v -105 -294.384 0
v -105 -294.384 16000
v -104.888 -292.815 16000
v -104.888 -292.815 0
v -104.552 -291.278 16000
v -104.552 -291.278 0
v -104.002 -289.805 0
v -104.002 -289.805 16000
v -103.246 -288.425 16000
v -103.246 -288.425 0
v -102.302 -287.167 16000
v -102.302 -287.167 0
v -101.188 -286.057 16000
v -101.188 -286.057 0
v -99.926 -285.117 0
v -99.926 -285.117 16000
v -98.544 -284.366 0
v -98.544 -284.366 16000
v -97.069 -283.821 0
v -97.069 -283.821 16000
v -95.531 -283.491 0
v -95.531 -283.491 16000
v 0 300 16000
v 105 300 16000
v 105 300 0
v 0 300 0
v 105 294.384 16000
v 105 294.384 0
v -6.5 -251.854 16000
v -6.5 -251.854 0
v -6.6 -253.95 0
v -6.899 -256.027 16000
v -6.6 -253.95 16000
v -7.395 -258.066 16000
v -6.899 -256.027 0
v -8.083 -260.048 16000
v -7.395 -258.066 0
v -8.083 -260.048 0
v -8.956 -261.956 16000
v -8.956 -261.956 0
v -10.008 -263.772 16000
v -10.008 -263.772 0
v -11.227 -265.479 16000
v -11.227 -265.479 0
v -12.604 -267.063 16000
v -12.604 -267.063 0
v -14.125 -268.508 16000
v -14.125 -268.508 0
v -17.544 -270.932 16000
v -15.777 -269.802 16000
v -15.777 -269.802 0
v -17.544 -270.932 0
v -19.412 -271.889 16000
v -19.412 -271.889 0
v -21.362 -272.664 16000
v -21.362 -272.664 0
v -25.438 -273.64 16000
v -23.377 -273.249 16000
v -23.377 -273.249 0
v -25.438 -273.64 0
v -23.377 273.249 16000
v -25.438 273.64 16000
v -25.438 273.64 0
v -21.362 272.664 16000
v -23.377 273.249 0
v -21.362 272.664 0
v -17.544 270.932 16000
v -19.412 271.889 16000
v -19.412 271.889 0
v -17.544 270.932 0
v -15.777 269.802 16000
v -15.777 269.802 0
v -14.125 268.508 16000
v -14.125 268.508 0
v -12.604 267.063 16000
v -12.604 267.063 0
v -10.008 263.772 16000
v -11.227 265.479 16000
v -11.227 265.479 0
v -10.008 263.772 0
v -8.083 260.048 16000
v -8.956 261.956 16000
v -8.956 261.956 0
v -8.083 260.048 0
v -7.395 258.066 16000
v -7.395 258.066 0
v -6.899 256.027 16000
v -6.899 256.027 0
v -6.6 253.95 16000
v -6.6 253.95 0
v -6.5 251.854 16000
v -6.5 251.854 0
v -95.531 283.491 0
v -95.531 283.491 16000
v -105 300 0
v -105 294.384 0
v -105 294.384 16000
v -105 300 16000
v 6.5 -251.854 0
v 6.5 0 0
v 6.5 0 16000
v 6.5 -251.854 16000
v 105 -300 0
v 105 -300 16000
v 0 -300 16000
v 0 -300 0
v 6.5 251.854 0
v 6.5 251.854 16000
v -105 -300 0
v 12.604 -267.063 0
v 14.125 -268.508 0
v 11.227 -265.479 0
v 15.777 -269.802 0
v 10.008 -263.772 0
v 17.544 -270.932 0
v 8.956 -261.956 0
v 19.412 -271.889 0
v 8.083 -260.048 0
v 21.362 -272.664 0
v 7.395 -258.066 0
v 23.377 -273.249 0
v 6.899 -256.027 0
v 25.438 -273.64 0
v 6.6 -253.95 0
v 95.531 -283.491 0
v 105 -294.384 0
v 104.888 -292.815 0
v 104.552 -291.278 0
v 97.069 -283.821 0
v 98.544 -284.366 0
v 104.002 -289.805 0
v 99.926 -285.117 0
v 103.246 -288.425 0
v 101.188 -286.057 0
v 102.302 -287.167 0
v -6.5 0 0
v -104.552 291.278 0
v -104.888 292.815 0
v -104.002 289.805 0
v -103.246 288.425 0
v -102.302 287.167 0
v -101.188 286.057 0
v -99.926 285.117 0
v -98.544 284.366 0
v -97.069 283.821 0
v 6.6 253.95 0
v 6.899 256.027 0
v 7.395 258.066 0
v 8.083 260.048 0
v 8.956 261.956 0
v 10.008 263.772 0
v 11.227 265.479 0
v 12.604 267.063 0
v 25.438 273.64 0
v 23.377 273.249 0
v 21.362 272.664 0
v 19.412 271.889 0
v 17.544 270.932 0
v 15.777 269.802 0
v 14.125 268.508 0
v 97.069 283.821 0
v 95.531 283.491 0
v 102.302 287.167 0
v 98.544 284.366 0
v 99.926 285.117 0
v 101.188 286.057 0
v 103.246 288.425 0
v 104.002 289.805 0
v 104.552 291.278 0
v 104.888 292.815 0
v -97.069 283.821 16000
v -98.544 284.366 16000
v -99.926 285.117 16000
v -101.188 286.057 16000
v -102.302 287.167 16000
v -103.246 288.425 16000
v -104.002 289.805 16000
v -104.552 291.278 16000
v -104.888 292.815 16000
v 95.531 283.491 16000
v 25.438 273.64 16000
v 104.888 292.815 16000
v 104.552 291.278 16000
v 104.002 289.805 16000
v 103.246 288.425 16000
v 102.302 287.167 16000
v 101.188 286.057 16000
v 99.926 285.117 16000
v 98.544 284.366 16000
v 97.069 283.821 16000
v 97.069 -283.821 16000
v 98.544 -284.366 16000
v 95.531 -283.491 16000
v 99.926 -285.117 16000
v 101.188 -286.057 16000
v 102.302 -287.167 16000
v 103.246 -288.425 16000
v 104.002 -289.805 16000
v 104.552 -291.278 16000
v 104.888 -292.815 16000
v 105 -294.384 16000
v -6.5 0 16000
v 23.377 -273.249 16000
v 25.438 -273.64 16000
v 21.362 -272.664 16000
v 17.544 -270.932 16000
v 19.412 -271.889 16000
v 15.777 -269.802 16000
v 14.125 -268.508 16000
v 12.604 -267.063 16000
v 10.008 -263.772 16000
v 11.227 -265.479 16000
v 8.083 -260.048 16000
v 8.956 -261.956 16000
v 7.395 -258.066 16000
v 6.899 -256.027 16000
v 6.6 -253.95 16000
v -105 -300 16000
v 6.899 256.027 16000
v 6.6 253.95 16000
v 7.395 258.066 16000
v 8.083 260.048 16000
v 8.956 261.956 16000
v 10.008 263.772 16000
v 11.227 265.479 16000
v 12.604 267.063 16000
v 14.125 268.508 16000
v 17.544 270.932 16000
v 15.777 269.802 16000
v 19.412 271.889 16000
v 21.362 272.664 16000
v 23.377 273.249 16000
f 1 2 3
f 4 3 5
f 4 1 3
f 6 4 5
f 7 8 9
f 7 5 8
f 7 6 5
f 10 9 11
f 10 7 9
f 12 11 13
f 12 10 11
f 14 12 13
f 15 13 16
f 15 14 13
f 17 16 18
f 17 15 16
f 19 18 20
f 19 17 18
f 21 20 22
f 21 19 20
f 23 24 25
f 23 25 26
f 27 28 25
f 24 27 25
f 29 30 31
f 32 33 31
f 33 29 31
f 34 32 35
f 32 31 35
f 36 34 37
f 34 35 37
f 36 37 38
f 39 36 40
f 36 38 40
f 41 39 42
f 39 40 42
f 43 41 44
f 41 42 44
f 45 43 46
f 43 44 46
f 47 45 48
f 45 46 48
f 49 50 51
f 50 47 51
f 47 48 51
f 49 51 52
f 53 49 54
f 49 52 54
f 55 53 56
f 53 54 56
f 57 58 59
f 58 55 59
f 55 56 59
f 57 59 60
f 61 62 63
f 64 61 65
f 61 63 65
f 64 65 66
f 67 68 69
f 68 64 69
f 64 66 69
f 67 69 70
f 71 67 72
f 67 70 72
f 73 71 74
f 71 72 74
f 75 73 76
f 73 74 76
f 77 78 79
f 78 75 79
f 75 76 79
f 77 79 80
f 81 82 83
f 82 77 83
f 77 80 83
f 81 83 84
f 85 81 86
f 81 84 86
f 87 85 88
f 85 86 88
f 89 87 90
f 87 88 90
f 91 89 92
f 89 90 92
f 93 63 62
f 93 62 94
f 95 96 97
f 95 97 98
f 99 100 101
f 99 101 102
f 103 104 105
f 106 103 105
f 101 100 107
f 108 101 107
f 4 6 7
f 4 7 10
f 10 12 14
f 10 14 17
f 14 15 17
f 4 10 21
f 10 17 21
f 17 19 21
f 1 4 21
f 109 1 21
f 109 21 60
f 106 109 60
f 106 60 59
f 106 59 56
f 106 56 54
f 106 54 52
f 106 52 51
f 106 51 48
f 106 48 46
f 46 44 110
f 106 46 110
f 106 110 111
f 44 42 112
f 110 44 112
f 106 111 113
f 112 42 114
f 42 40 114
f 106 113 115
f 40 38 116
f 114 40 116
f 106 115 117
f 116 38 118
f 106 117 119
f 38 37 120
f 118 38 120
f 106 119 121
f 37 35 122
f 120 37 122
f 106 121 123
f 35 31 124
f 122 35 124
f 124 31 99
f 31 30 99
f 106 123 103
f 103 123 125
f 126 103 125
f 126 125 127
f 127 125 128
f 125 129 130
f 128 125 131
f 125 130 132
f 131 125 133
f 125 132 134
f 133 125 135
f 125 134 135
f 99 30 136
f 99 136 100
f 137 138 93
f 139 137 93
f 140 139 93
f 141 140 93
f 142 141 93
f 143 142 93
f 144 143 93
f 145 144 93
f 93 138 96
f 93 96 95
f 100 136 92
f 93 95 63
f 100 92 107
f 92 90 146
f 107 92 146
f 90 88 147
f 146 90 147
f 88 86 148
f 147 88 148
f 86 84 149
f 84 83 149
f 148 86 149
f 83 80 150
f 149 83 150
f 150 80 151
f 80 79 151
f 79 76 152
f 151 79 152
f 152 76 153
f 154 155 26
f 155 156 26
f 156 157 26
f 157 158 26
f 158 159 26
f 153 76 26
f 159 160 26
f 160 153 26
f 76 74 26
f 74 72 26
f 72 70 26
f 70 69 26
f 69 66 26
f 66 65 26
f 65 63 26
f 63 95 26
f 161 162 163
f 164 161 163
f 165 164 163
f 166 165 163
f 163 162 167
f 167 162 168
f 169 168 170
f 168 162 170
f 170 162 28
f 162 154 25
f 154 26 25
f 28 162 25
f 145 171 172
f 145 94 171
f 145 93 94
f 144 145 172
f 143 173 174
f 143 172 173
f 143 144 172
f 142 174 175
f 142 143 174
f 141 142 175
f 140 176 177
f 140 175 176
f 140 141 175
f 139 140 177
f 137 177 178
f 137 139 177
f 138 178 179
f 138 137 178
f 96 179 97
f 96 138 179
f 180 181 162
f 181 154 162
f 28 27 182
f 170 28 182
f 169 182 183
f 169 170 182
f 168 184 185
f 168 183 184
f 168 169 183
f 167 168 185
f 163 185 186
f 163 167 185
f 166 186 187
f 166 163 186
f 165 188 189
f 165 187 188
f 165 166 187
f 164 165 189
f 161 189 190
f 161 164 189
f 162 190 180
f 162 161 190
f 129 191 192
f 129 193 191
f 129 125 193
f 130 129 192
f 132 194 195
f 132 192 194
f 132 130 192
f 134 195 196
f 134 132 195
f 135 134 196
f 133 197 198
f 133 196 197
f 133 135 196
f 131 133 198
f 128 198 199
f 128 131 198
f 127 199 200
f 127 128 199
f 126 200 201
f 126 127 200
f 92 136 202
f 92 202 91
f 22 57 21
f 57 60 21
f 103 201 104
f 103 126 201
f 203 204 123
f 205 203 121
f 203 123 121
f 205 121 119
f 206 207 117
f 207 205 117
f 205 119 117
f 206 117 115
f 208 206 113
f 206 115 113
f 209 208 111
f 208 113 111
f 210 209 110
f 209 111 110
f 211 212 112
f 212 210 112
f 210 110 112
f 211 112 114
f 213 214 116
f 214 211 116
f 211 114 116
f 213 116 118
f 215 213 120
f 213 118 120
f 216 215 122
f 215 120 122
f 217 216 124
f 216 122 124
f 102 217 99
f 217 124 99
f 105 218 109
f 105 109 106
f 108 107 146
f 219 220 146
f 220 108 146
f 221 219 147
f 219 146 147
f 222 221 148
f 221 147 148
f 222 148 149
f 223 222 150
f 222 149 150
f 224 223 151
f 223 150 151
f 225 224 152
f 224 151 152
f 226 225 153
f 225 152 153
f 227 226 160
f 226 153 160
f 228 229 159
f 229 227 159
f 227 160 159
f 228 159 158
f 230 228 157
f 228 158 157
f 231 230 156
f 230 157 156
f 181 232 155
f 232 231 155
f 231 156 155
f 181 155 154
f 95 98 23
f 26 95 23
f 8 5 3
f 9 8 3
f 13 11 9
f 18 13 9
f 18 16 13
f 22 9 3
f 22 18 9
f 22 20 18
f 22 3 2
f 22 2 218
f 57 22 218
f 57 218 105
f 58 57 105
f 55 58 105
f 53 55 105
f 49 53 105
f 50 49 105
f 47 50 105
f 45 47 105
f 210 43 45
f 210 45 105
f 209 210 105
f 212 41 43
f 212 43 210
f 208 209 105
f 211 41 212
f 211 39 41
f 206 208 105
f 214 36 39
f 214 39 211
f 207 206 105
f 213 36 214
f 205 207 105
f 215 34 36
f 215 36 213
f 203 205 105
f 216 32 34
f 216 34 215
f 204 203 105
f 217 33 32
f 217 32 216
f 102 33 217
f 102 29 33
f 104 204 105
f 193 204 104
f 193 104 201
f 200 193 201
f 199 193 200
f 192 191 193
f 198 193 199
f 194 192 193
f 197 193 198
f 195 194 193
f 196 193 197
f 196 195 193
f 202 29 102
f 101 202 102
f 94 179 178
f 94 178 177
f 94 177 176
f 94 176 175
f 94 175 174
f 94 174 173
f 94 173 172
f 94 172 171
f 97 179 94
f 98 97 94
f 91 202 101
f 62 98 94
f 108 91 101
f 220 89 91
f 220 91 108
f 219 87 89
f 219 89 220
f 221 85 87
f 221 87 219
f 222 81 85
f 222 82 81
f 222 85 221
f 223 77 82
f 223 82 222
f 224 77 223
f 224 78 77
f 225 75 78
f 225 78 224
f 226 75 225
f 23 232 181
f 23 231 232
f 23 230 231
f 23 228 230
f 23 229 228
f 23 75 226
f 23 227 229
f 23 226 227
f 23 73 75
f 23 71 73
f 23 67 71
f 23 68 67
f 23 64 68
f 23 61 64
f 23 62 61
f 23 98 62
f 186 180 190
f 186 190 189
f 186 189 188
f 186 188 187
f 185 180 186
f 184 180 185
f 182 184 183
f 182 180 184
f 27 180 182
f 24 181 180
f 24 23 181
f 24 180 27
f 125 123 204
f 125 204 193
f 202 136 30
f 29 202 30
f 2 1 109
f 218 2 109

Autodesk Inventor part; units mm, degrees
ref_plane "YZ Plane" through (0, 0, 0) normal (1, 0, 0) x (0, 1, 0)
ref_plane "Startebene" through (0, 0, 0) normal (0, 0, 1) x (1, 0, 0)
ref_plane "Endebene" through (0, 0, 16000) normal (0, 0, 1) x (1, 0, 0)
sketch "Skizze" plane through (0, 0, 0) normal (0, 0, 1) x (1, 0, 0)
  line L0 (-6.5, 0) -> (-6.5, -251.8541)
  line L1 (-25.4382, -273.64) -> (-95.5309, -283.4908)
  line L2 (-105, -294.3838) -> (-105, -300)
  line L3 (-105, -300) -> (0, -300)
  line L4 (-55.75, -300) -> (-55.75, -277.9) construction
  line L5 (-25.7112, 0) -> (34.2816, 0) construction
  line L6 (0, 40) -> (0, -300) construction
  line L7 (0, -48) -> (0, 64) construction
  line L8 (6.5, 0) -> (6.5, -251.8541)
  line L9 (25.4382, -273.64) -> (95.5309, -283.4908)
  line L10 (105, -294.3838) -> (105, -300)
  line L11 (105, -300) -> (0, -300)
  line L12 (-6.5, 0) -> (6.5, 0) construction
  line L13 (-6.5, 0) -> (-6.5, 251.8541)
  line L14 (-25.4382, 273.64) -> (-95.5309, 283.4908)
  line L15 (-105, 294.3838) -> (-105, 300)
  line L16 (-105, 300) -> (0, 300)
  line L17 (6.5, 0) -> (6.5, 251.8541)
  line L18 (25.4382, 273.64) -> (95.5309, 283.4908)
  line L19 (105, 294.3838) -> (105, 300)
  line L20 (105, 300) -> (0, 300)
  arc A0 (-105, 294.3838) -> (-95.5309, 283.4908) centre (-94, 294.3838) ccw
  arc A1 (95.5309, 283.4908) -> (105, 294.3838) centre (94, 294.3838) ccw
  arc A2 (105, -294.3838) -> (95.5309, -283.4908) centre (94, -294.3838) ccw
  arc A3 (-95.5309, -283.4908) -> (-105, -294.3838) centre (-94, -294.3838) ccw
  arc A4 (-6.5, 251.8541) -> (-25.4382, 273.64) centre (-28.5, 251.8541) ccw
  arc A5 (25.4382, 273.64) -> (6.5, 251.8541) centre (28.5, 251.8541) ccw
  arc A6 (6.5, -251.8541) -> (25.4382, -273.64) centre (28.5, -251.8541) ccw
  arc A7 (-25.4382, -273.64) -> (-6.5, -251.8541) centre (-28.5, -251.8541) ccw
  line L21 (0, 420) -> (0, -420) construction
  line L22 (-149.8509, 0) -> (149.8509, 0) construction
  point P0 (-6.5, -270.9784)
  point P1 (-105, -284.8216)
  point P2 (6.5, -270.9784)
  point P3 (105, -284.8216)
  point P4 (55.75, -300)
  point P5 (55.75, -277.9)
  point P6 (-6.5, 270.9784)
  point P7 (-105, 284.8216)
  point P8 (-55.75, 300)
  point P9 (-55.75, 277.9)
  point P10 (6.5, 270.9784)
  point P11 (105, 284.8216)
  point P12 (55.75, 277.9)
  point P13 (55.75, 300)
  dimension "d1" = 6.9216
  dimension "d2" = 22.1
  dimension "d3" = 49.25
  dimension "d4" = 6.5
  dimension "d5" = 105
  dimension "d10" = 300
  dimension "d14" = 11
  dimension "d15" = 22
extrude "Körper" add sketch "Skizze" along normal up to surface (16000 mm away) from surface at 0
sketch "Sketch3" plane through (0, 0, 0) normal (0, 0, 1) x (1, 0, 0)
  line L0 (0, 0) -> (10, 0)
ref_plane "Work Plane3" through (0, 0, 0) normal (0, -1, 0) x (1, 0, 0)
sketch "Sketch4" plane through (0, 0, 0) normal (0, -1, 0) x (1, 0, 0)
  line L0 (-2, 0) -> (12, 0)
  line L1 (-2, 16000) -> (12, 16000)
  dimension "d19" = 16000
equation "\"d2\" = G_T1"
equation "\"d3\" = G_C"
equation "\"d4\" = 0.5 * G_T"
equation "\"d5\" = 0.5 * G_W"
equation "\"d10\" = 0.5 * G_H"
equation "\"d14\" = G_ER"
equation "\"d15\" = G_IR"
equation "\"d6\" = G_L"
equation "\"G_W\" = 210"
equation "\"G_H\" = 600"
equation "\"G_T\" = 13"
equation "\"G_T1\" = 22.1"
equation "\"G_C\" = 49.25"
equation "\"G_NG\" = 0.140541"
equation "\"G_L\" = d19"
equation "\"G_ER\" = 0.5 * G_IR"
equation "\"G_IR\" = 22"
equation "\"G_OFFSET_START\" = 0"
equation "\"G_OFFSET_END\" = 0"
equation "\"d17\" = G_OFFSET_END + B_L"
equation "\"B_L\" = 16000"
properties part number "ISO 657/15 - SB 600x131 - 16000" material "Stahl, weich"
